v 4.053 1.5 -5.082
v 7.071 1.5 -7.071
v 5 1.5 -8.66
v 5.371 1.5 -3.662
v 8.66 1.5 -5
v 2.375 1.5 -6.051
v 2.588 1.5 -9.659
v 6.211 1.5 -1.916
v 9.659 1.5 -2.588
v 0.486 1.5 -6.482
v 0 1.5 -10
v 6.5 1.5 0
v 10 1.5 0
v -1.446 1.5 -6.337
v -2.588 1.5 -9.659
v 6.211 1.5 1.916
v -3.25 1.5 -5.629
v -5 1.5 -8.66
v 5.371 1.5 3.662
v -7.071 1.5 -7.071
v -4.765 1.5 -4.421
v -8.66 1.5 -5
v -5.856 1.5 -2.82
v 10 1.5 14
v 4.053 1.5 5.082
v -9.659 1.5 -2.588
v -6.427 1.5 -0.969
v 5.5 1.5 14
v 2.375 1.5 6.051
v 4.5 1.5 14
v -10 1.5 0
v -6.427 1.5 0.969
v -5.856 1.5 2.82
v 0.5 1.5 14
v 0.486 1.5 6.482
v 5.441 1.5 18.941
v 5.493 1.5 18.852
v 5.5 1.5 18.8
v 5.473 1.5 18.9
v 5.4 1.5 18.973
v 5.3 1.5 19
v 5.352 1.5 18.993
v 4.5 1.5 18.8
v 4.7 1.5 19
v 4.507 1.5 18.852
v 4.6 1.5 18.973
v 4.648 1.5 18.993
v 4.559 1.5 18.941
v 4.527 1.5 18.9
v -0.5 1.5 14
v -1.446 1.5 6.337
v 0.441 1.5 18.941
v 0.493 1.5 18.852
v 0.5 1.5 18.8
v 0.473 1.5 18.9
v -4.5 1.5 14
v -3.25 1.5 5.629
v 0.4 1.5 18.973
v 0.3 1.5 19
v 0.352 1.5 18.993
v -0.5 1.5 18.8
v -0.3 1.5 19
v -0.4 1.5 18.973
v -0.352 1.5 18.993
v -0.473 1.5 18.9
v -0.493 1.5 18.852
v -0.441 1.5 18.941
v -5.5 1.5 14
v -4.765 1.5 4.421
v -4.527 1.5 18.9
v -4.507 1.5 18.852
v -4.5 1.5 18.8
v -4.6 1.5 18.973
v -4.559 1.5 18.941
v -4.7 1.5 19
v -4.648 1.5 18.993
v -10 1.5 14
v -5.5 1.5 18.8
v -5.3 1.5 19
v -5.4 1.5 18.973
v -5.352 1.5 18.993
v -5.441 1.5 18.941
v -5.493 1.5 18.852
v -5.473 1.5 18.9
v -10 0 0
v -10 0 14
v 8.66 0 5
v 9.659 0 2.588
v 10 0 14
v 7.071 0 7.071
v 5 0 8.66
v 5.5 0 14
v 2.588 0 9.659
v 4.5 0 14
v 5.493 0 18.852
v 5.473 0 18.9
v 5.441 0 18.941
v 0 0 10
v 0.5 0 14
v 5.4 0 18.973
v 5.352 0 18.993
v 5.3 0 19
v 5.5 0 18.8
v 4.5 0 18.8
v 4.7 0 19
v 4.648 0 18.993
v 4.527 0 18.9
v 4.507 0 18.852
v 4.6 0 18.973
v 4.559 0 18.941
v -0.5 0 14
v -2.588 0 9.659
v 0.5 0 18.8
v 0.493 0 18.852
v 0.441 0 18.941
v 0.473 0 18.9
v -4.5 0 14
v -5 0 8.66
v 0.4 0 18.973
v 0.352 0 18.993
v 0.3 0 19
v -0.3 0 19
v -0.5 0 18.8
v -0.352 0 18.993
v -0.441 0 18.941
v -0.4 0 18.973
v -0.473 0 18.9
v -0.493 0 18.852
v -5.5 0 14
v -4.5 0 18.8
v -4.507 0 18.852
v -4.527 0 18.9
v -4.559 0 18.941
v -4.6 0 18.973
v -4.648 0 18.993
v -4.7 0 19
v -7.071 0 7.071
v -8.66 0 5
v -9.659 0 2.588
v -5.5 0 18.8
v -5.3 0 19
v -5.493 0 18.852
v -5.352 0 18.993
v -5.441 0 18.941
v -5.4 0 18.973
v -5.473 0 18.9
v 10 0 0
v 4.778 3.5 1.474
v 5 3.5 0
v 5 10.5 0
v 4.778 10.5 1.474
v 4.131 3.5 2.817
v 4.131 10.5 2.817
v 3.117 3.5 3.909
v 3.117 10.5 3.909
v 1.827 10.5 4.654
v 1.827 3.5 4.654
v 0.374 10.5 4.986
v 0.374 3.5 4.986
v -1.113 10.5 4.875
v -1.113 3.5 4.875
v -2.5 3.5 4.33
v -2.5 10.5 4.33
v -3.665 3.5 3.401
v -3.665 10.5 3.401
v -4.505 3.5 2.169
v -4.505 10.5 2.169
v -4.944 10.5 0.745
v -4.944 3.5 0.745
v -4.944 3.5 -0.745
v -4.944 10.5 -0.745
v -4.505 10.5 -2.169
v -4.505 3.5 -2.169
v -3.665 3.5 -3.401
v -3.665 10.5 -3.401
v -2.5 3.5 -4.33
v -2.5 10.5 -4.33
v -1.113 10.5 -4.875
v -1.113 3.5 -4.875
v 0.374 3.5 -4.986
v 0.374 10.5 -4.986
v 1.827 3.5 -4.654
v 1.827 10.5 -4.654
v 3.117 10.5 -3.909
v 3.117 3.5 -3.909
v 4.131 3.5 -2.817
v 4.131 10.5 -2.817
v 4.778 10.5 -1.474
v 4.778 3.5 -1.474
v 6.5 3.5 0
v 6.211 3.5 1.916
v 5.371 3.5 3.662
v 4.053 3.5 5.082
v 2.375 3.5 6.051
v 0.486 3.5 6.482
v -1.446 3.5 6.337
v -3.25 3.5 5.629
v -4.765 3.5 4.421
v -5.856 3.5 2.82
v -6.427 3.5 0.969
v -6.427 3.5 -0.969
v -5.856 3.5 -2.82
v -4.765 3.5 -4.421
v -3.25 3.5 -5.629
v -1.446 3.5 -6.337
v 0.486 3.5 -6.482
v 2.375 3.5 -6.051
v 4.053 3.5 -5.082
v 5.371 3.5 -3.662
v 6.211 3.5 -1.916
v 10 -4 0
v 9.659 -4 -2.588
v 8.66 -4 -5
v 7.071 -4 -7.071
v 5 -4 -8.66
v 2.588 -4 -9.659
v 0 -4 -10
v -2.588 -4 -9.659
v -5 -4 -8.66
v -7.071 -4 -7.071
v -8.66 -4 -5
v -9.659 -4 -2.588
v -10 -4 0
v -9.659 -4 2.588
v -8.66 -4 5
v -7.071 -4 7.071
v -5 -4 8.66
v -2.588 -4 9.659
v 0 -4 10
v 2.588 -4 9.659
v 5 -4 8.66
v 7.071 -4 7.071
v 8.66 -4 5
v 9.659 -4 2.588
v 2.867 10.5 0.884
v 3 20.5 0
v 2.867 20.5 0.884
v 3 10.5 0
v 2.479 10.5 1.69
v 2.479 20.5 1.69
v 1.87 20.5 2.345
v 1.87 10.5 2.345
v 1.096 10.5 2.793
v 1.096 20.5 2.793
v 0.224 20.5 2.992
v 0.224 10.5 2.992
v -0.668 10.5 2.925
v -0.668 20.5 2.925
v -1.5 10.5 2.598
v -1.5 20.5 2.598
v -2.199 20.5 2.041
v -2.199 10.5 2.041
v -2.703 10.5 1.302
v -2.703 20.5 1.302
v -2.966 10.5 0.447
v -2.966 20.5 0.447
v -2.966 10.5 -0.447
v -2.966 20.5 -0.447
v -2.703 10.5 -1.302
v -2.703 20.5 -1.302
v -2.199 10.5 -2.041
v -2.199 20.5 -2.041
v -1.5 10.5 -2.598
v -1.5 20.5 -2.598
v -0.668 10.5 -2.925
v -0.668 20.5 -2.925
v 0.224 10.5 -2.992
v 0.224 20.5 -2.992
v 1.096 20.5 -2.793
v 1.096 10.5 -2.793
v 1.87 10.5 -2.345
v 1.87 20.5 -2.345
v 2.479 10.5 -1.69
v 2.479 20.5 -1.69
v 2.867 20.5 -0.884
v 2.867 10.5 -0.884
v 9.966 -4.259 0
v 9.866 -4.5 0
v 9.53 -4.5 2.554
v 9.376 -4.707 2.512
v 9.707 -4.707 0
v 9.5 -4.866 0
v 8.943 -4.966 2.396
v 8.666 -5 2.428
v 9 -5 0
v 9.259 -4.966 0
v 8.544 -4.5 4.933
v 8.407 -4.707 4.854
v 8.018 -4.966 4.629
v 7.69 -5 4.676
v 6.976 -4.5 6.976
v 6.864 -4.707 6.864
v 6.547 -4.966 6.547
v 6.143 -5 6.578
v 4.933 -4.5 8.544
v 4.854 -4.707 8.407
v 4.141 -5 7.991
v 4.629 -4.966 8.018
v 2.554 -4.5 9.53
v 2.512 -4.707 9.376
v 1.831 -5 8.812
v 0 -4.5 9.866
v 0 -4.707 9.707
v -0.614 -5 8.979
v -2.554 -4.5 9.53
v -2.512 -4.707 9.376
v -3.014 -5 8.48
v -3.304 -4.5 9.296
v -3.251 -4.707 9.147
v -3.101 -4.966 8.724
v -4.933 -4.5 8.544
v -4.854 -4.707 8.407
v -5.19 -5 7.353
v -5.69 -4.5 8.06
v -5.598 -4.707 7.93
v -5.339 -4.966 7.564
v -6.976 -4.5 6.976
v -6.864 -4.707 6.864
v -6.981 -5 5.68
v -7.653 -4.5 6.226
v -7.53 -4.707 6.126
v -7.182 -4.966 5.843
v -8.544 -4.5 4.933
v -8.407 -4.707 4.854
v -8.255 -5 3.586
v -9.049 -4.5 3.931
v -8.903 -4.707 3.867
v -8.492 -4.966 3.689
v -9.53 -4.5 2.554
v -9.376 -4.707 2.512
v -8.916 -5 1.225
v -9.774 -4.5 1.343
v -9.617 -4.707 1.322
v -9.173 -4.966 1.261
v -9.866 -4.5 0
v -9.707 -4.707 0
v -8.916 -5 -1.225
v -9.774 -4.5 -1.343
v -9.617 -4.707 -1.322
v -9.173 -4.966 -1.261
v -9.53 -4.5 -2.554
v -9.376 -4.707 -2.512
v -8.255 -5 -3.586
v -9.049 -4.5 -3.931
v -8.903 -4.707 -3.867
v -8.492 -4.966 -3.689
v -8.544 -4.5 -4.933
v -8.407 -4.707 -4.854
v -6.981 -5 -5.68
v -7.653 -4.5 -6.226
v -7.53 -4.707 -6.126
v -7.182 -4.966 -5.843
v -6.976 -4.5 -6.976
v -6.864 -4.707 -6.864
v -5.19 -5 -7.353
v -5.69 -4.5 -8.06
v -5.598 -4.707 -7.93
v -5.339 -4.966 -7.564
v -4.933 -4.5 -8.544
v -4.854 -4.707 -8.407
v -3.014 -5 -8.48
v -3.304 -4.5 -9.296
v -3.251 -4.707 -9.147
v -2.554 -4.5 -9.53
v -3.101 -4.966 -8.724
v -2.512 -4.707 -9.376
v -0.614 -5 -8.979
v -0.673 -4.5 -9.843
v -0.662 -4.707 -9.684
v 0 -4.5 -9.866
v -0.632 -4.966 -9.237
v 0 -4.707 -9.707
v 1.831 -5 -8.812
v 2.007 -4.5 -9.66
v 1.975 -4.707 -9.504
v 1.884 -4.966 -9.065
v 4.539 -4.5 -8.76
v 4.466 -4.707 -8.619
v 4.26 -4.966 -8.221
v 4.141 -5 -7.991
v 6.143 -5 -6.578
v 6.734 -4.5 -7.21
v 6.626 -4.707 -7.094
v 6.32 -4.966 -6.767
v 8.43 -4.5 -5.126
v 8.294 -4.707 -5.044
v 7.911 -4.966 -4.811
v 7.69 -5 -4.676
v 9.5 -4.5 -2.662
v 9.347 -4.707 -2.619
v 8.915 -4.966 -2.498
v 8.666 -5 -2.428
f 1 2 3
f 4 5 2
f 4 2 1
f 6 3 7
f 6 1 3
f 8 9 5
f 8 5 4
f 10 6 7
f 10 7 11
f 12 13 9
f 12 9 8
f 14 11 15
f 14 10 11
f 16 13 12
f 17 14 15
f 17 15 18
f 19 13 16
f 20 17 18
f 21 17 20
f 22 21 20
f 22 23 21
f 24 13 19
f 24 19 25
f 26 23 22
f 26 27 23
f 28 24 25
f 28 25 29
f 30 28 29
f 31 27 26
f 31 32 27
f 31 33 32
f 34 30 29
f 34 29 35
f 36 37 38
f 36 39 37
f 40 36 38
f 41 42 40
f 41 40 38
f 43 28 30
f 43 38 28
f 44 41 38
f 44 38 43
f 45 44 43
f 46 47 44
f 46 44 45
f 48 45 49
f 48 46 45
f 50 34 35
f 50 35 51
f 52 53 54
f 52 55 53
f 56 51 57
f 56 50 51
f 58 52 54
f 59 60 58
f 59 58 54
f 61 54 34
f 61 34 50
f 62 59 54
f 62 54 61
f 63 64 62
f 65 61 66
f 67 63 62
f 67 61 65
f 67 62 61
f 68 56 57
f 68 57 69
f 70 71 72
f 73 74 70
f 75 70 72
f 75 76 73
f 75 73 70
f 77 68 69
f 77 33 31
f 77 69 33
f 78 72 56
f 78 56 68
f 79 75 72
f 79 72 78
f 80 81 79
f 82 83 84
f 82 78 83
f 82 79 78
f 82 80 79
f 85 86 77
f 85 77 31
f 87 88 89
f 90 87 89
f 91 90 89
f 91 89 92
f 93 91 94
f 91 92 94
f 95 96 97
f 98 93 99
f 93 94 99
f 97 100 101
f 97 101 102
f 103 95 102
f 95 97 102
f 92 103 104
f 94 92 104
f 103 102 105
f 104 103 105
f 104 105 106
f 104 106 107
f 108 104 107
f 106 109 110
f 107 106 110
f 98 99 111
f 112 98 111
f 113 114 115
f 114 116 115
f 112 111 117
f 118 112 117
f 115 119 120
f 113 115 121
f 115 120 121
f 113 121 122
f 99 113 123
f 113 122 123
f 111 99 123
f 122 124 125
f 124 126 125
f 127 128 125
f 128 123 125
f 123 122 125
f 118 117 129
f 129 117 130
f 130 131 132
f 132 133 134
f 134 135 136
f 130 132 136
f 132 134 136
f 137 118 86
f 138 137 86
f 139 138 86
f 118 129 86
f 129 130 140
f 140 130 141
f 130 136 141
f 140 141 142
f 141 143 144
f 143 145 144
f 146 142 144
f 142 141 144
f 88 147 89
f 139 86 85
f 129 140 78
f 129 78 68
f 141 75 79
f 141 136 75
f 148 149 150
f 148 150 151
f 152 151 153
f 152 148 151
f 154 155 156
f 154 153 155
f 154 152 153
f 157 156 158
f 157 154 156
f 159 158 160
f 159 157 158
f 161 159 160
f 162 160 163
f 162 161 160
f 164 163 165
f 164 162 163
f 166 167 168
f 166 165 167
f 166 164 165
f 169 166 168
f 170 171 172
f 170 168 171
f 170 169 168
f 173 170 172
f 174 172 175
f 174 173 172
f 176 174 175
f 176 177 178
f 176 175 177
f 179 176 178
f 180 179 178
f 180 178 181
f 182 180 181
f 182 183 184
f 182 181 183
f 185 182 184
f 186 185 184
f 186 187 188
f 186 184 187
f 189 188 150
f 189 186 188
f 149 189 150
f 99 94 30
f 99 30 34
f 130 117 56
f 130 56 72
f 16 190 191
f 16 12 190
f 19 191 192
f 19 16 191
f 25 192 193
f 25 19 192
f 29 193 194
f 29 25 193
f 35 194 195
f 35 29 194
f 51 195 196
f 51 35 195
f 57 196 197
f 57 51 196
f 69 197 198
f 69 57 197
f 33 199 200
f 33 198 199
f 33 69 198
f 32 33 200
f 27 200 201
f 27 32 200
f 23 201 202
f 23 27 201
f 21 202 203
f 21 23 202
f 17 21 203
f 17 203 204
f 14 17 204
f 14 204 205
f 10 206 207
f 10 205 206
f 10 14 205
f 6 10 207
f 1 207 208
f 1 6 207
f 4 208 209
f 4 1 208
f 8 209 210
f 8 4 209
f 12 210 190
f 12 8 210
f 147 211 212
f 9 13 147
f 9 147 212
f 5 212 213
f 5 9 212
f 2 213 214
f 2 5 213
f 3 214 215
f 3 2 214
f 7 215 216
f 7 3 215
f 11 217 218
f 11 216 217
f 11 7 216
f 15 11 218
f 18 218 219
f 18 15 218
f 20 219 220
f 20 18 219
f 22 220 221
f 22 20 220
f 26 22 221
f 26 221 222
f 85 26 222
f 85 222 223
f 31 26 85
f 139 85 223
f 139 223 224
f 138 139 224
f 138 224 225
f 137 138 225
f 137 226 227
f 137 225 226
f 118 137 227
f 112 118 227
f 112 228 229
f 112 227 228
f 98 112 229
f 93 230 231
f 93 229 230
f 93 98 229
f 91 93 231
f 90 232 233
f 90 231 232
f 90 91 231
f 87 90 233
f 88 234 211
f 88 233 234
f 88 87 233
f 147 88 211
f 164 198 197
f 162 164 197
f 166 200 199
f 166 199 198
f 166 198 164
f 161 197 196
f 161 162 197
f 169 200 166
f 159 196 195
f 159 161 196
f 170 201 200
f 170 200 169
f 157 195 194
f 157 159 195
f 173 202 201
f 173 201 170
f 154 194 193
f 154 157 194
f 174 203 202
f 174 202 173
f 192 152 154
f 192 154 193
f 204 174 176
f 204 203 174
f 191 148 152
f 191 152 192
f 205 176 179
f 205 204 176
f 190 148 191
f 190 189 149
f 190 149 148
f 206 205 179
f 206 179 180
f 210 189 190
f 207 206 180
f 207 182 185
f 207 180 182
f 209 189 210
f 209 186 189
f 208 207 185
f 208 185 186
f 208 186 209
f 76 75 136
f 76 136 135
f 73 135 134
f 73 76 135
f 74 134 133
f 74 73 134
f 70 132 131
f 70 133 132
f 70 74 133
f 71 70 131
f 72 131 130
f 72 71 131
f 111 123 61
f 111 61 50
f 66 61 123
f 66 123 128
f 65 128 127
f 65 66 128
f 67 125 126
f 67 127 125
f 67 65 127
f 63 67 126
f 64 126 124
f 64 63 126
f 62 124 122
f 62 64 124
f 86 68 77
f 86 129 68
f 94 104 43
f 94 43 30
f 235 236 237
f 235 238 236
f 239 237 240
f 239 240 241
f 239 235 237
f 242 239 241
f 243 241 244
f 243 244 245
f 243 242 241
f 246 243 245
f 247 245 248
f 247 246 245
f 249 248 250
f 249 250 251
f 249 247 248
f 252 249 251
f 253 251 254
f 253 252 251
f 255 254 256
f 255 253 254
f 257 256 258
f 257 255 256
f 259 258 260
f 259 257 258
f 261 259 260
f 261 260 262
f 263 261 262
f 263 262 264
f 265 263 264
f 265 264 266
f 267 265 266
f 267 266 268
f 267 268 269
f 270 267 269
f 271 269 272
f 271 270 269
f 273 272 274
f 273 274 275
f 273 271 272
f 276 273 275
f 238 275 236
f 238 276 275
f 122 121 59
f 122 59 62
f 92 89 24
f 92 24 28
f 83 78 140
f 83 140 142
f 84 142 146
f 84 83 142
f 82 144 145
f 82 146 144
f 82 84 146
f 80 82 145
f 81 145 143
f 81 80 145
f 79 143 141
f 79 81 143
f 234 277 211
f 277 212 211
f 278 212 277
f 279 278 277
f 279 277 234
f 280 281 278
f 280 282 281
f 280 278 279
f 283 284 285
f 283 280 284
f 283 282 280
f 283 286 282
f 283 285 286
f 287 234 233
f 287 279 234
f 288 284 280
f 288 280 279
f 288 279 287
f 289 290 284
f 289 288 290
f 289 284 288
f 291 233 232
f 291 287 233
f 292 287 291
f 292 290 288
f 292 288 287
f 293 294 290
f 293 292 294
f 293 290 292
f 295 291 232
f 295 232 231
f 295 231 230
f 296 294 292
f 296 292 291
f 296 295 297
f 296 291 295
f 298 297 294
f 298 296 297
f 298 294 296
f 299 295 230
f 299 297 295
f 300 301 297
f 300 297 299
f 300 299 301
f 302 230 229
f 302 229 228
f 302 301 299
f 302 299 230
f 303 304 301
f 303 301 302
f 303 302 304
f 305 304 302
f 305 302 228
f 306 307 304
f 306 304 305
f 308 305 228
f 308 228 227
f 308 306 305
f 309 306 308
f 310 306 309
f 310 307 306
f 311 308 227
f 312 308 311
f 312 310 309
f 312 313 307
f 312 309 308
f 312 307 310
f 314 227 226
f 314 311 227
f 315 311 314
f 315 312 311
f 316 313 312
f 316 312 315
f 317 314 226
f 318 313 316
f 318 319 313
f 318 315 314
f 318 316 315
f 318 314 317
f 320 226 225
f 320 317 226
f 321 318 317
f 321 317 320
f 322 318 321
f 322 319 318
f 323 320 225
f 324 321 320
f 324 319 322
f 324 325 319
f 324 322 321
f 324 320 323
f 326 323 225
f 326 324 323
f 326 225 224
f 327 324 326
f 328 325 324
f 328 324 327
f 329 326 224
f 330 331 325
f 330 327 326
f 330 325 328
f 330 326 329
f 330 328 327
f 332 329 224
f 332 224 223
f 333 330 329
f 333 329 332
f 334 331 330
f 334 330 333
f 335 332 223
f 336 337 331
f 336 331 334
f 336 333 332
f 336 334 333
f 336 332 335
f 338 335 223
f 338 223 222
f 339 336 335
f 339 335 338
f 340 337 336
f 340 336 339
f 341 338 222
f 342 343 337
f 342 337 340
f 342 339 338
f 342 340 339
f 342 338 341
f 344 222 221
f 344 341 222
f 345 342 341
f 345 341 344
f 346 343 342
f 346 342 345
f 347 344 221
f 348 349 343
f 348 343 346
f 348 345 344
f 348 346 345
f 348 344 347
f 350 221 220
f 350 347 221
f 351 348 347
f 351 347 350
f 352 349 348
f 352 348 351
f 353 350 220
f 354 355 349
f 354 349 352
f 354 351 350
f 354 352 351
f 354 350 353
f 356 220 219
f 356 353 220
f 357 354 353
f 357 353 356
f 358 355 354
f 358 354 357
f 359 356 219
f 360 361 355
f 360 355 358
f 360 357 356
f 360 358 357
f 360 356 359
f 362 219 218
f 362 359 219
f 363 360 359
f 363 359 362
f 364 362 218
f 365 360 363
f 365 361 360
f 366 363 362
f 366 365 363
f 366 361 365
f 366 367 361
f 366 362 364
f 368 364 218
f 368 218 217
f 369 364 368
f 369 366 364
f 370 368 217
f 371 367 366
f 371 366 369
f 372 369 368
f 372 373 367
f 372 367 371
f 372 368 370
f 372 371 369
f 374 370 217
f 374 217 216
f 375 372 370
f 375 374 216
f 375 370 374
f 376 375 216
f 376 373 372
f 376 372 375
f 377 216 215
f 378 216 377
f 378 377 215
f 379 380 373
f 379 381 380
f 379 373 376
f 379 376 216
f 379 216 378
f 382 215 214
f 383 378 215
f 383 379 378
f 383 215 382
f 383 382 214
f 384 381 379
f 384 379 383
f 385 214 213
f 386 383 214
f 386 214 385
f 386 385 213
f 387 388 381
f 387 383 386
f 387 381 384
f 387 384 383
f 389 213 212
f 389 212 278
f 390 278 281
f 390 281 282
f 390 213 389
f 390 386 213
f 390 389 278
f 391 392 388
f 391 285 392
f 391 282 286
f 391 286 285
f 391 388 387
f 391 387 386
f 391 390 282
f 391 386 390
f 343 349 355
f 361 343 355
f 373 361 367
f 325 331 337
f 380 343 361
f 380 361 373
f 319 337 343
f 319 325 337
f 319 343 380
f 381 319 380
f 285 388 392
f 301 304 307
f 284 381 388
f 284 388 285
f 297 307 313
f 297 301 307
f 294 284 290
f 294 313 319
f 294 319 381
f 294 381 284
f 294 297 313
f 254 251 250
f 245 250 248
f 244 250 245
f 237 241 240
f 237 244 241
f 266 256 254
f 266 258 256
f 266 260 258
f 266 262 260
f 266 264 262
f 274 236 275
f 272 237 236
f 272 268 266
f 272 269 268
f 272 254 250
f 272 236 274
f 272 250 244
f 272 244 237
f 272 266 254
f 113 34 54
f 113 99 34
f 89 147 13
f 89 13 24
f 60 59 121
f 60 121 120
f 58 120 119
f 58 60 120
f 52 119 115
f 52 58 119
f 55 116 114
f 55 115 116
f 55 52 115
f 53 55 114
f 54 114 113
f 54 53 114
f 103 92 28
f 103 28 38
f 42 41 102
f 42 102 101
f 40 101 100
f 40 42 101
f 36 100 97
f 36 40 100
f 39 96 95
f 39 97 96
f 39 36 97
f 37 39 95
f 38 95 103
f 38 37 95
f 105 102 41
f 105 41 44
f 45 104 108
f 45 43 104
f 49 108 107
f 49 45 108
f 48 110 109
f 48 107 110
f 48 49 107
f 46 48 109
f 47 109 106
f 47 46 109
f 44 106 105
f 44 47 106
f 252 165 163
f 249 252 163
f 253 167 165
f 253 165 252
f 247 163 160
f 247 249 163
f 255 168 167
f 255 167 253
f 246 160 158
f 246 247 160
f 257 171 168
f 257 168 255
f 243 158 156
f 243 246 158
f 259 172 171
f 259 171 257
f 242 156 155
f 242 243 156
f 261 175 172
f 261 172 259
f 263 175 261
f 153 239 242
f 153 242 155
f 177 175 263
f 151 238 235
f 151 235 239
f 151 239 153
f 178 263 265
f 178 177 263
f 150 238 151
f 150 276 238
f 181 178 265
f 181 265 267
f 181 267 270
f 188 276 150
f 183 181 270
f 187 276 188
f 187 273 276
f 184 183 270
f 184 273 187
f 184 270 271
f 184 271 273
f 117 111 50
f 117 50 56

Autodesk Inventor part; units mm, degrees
ref_plane "YZ Plane" through (0, 0, 0) normal (1, 0, 0) x (0, 1, 0)
ref_plane "XZ Plane" through (0, 0, 0) normal (0, 1, 0) x (-1, 0, 0)
ref_plane "XY Plane" through (0, 0, 0) normal (0, 0, 1) x (1, 0, 0)
sketch "Sketch1" plane through (0, 0, 0) normal (0, 1, 0) x (-1, 0, 0)
  circle A0 centre (0, 0) radius 10
  line L0 (10, 0) -> (-10, 0)
  line L1 (-10, 0) -> (-10, 14)
  line L2 (-10, 14) -> (10, 14)
  line L3 (10, 14) -> (10, 0)
  line L4 (-5.5, 14) -> (-4.5, 14)
  line L5 (-0.5, 14) -> (0.5, 14)
  line L6 (4.5, 14) -> (5.5, 14)
  line L7 (5.5, 14) -> (4.5, 14)
  line L8 (4.5, 14) -> (4.5, 19)
  line L9 (4.5, 19) -> (5.5, 19)
  line L10 (5.5, 19) -> (5.5, 14)
  line L11 (0.5, 14) -> (-0.5, 14)
  line L12 (-0.5, 14) -> (-0.5, 19)
  line L13 (-0.5, 19) -> (0.5, 19)
  line L14 (0.5, 19) -> (0.5, 14)
  line L15 (-4.5, 14) -> (-5.5, 14)
  line L16 (-5.5, 14) -> (-5.5, 19)
  line L17 (-5.5, 19) -> (-4.5, 19)
  line L18 (-4.5, 19) -> (-4.5, 14)
  point P0 (0, 14)
  point P1 (5, 14)
  point P2 (-5, 14)
  dimension "d0" = 20
  dimension "d1" = 20
  dimension "d2" = 14
  dimension "d5" = 1
  dimension "d6" = 1
  dimension "d7" = 1
  dimension "d8" = 5
  dimension "d9" = 5
  dimension "d10" = 5
extrude "Extrusion1" add sketch "Sketch1" along normal blind 1.5
sketch "Sketch2" plane through (0, 0, 0) normal (0, -1, 0) x (1, 0, 0)
  circle A0 centre (0, 0) radius 10
extrude "Extrusion2" add sketch "Sketch2" along normal blind 5
sketch "Sketch3" plane through (0, 1.5, 0) normal (0, 1, 0) x (1, 0, 0)
  circle A0 centre (0, 0) radius 6.5
  dimension "d13" = 13
extrude "Extrusion3" add sketch "Sketch3" along normal blind 2
sketch "Sketch4" plane through (0, 3.5, 0) normal (0, 1, 0) x (1, 0, 0)
  circle A0 centre (0, 0) radius 5
  dimension "d16" = 10
extrude "Extrusion4" add sketch "Sketch4" along normal blind 7
thread "Thread1" size "M3x0.5" class "6g" standard "ANSI Metric M Profile" full length
sketch "Sketch5" plane through (0, 10.5, 0) normal (0, 1, 0) x (1, 0, 0)
  circle A0 centre (0, 0) radius 3
  line L0 (0, 0) -> (1.5, 0)
  line L1 (1.5, -2.5981) -> (1.5, 2.5981)
  point P0 (0.0162, 1.5)
  point P1 (-2.4, 1.8)
  dimension "d21" = 6
  dimension "d27" = 1.5
extrude "Extrusion5" add sketch "Sketch5" along normal blind 10
fillet "Fillet1" radius 1 1 edges at (-10, -5, 0)
fillet "Fillet2" radius 0.2 6 edges at (5.5, 0.75, 19) (4.5, 0.75, 19) (0.5, 0.75, 19) (-0.5, 0.75, 19) (-4.5, 0.75, 19) (-5.5, 0.75, 19)
properties part number "PotMeter"
